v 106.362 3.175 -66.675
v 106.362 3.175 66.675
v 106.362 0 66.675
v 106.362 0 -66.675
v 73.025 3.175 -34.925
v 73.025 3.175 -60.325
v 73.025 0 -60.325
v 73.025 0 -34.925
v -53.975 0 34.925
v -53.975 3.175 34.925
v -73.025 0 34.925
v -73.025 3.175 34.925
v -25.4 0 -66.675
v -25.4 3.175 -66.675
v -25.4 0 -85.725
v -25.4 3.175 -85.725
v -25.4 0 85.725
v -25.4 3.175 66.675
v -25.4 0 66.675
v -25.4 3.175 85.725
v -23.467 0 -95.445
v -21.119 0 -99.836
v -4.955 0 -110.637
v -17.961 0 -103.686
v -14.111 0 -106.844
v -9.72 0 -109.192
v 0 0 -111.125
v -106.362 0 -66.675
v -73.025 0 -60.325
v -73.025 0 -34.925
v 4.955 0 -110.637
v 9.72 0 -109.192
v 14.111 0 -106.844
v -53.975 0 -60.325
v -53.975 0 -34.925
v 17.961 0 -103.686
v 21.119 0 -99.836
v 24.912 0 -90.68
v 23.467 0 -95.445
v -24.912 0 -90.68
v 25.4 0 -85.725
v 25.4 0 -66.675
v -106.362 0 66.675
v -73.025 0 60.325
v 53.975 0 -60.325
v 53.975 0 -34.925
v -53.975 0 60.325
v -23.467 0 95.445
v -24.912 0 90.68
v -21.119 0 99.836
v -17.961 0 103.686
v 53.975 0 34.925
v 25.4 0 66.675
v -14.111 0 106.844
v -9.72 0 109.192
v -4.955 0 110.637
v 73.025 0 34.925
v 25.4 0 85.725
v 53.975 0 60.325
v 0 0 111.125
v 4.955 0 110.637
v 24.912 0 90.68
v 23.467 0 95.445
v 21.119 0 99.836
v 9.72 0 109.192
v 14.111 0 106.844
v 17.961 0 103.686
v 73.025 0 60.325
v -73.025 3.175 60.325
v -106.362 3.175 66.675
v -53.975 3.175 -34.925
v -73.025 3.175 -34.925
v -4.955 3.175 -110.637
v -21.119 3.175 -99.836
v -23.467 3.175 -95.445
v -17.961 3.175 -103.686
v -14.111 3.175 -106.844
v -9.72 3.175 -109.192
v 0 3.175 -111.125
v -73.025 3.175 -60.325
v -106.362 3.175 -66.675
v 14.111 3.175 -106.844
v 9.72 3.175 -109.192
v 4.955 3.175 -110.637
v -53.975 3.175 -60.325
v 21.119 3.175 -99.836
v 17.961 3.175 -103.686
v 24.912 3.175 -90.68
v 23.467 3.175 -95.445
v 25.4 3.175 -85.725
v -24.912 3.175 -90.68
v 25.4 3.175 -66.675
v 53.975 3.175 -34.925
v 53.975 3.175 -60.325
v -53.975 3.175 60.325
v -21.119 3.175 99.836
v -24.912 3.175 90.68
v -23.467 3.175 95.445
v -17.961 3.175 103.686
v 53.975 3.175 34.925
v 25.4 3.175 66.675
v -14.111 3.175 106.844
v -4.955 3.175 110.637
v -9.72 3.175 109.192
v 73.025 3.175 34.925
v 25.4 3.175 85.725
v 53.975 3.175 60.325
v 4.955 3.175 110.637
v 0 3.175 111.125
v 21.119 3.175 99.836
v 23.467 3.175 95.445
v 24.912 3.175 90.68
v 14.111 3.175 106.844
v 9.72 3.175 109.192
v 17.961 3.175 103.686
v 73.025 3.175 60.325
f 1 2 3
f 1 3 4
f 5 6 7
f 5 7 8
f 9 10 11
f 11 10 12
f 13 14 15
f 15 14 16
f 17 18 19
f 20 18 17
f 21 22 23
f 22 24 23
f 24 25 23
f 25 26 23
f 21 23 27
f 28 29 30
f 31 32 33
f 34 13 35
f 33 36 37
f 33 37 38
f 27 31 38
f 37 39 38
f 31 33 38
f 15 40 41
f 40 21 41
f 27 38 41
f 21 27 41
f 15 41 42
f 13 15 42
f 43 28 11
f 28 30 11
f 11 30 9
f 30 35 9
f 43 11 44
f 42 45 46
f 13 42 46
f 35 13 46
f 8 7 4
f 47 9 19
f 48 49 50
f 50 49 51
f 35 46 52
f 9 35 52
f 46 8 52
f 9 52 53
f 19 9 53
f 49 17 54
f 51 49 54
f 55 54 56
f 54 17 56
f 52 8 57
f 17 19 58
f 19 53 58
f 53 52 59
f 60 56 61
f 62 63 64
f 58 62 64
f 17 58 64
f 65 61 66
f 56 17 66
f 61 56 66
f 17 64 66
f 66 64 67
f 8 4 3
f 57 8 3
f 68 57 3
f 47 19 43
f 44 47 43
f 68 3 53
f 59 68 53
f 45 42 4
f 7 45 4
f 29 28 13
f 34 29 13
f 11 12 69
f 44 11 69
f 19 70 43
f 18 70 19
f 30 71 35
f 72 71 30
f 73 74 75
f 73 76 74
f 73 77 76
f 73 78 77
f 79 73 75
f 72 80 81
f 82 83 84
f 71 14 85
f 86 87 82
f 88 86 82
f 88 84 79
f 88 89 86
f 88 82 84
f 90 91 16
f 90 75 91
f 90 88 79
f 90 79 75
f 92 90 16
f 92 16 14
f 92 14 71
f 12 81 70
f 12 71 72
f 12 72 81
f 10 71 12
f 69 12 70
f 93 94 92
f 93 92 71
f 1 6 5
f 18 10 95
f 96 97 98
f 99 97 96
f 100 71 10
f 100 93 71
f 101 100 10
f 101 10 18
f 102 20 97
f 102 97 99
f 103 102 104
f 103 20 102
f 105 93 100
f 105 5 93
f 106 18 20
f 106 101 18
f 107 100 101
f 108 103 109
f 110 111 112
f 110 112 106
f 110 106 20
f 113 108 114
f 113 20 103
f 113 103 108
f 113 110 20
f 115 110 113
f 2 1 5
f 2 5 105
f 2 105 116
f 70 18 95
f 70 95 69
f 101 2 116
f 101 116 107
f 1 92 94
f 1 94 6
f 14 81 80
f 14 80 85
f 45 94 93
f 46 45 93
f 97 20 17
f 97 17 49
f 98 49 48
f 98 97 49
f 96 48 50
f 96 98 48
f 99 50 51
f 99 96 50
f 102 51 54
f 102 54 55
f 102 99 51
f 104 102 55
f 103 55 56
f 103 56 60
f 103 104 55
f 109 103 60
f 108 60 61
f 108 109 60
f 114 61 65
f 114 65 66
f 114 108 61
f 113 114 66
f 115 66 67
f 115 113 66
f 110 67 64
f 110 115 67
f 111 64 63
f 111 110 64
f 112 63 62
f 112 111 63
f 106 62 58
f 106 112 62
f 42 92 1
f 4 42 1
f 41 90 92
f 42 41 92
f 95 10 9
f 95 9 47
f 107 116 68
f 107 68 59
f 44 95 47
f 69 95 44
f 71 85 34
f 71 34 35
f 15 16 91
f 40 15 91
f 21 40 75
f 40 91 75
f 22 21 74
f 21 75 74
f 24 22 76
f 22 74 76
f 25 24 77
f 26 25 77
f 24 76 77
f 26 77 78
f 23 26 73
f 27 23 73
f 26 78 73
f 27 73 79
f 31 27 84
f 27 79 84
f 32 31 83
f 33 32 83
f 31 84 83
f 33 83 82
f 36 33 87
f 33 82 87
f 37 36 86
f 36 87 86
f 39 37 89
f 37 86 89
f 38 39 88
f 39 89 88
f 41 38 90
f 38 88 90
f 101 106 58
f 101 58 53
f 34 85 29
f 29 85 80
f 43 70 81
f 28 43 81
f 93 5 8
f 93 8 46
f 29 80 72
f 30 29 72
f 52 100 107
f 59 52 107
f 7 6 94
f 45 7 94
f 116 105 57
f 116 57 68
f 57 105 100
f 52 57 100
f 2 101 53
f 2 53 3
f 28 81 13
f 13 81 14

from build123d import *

# Parameters (mm, degrees)
SKETCH1_R           = 137.941576563
EXTRUDE1_DEPTH      = 3.175
SKETCH2_W           = 19.05
SKETCH2_H           = 25.4
EXTRUDE2_DEPTH      = 4.175
SKETCH3_OUTSIDE_W   = 355.918
SKETCH3_OUTSIDE_H   = 355.918
SKETCH3_OUTSIDE_W_2 = 212.725
SKETCH3_OUTSIDE_H_2 = 133.35
EXTRUDE3_DEPTH      = 4.175
EXTRUDE4_DEPTH      = 3.175


with BuildPart() as part:
    # Sketch1 → Extrude1 (new body)
    with BuildSketch(Plane(origin=(0, 0, 0), x_dir=(1, 0, 0), z_dir=(0, 1, 0))):
        with Locations(Location((0, 0, 0), (0, 0, 270))):  # turned: the seam where the file's is
            Circle(SKETCH1_R)
    extrude(amount=EXTRUDE1_DEPTH)

    # Sketch2 → Extrude2 (cut, through all)
    with BuildSketch(Plane(origin=(0, 3.175, 0), x_dir=(-1, 0, 0), z_dir=(0, 1, 0))):
        with Locations((63.5, -47.625)):
            Rectangle(SKETCH2_W, SKETCH2_H)
        with Locations((63.5, 47.625)):
            Rectangle(SKETCH2_W, SKETCH2_H)
        with Locations((-63.5, 47.625)):
            Rectangle(SKETCH2_W, SKETCH2_H)
        with Locations((-63.5, -47.625)):
            Rectangle(SKETCH2_W, SKETCH2_H)
    extrude(amount=-EXTRUDE2_DEPTH, mode=Mode.SUBTRACT)

    # Sketch3 outside → Extrude3 (cut, through all)
    with BuildSketch(Plane(origin=(0, 3.175, 0), x_dir=(1, 0, 0), z_dir=(0, 1, 0))):
        Rectangle(SKETCH3_OUTSIDE_W, SKETCH3_OUTSIDE_H)
        Rectangle(SKETCH3_OUTSIDE_W_2, SKETCH3_OUTSIDE_H_2, mode=Mode.SUBTRACT)
    extrude(amount=-EXTRUDE3_DEPTH, mode=Mode.SUBTRACT)

    # Sketch4 → Extrude4 (add, through all)
    with BuildSketch(Plane(origin=(0, 3.175, 0), x_dir=(-1, 0, 0), z_dir=(0, 1, 0))):
        with BuildLine():
            Line((-25.4, -66.675), (25.4, -66.675))
            Line((25.4, -66.675), (25.4, -85.725))
            ThreePointArc((25.4, -85.725), (0, -111.125), (-25.4, -85.725))
            Line((-25.4, -85.725), (-25.4, -66.675))
        make_face()
        with BuildLine():
            Line((25.4, 66.675), (25.4, 85.725))
            ThreePointArc((25.4, 85.725), (0, 111.125), (-25.4, 85.725))
            Line((-25.4, 85.725), (-25.4, 66.675))
            Line((-25.4, 66.675), (25.4, 66.675))
        make_face()
    extrude(amount=-EXTRUDE4_DEPTH)


solid = part.part
